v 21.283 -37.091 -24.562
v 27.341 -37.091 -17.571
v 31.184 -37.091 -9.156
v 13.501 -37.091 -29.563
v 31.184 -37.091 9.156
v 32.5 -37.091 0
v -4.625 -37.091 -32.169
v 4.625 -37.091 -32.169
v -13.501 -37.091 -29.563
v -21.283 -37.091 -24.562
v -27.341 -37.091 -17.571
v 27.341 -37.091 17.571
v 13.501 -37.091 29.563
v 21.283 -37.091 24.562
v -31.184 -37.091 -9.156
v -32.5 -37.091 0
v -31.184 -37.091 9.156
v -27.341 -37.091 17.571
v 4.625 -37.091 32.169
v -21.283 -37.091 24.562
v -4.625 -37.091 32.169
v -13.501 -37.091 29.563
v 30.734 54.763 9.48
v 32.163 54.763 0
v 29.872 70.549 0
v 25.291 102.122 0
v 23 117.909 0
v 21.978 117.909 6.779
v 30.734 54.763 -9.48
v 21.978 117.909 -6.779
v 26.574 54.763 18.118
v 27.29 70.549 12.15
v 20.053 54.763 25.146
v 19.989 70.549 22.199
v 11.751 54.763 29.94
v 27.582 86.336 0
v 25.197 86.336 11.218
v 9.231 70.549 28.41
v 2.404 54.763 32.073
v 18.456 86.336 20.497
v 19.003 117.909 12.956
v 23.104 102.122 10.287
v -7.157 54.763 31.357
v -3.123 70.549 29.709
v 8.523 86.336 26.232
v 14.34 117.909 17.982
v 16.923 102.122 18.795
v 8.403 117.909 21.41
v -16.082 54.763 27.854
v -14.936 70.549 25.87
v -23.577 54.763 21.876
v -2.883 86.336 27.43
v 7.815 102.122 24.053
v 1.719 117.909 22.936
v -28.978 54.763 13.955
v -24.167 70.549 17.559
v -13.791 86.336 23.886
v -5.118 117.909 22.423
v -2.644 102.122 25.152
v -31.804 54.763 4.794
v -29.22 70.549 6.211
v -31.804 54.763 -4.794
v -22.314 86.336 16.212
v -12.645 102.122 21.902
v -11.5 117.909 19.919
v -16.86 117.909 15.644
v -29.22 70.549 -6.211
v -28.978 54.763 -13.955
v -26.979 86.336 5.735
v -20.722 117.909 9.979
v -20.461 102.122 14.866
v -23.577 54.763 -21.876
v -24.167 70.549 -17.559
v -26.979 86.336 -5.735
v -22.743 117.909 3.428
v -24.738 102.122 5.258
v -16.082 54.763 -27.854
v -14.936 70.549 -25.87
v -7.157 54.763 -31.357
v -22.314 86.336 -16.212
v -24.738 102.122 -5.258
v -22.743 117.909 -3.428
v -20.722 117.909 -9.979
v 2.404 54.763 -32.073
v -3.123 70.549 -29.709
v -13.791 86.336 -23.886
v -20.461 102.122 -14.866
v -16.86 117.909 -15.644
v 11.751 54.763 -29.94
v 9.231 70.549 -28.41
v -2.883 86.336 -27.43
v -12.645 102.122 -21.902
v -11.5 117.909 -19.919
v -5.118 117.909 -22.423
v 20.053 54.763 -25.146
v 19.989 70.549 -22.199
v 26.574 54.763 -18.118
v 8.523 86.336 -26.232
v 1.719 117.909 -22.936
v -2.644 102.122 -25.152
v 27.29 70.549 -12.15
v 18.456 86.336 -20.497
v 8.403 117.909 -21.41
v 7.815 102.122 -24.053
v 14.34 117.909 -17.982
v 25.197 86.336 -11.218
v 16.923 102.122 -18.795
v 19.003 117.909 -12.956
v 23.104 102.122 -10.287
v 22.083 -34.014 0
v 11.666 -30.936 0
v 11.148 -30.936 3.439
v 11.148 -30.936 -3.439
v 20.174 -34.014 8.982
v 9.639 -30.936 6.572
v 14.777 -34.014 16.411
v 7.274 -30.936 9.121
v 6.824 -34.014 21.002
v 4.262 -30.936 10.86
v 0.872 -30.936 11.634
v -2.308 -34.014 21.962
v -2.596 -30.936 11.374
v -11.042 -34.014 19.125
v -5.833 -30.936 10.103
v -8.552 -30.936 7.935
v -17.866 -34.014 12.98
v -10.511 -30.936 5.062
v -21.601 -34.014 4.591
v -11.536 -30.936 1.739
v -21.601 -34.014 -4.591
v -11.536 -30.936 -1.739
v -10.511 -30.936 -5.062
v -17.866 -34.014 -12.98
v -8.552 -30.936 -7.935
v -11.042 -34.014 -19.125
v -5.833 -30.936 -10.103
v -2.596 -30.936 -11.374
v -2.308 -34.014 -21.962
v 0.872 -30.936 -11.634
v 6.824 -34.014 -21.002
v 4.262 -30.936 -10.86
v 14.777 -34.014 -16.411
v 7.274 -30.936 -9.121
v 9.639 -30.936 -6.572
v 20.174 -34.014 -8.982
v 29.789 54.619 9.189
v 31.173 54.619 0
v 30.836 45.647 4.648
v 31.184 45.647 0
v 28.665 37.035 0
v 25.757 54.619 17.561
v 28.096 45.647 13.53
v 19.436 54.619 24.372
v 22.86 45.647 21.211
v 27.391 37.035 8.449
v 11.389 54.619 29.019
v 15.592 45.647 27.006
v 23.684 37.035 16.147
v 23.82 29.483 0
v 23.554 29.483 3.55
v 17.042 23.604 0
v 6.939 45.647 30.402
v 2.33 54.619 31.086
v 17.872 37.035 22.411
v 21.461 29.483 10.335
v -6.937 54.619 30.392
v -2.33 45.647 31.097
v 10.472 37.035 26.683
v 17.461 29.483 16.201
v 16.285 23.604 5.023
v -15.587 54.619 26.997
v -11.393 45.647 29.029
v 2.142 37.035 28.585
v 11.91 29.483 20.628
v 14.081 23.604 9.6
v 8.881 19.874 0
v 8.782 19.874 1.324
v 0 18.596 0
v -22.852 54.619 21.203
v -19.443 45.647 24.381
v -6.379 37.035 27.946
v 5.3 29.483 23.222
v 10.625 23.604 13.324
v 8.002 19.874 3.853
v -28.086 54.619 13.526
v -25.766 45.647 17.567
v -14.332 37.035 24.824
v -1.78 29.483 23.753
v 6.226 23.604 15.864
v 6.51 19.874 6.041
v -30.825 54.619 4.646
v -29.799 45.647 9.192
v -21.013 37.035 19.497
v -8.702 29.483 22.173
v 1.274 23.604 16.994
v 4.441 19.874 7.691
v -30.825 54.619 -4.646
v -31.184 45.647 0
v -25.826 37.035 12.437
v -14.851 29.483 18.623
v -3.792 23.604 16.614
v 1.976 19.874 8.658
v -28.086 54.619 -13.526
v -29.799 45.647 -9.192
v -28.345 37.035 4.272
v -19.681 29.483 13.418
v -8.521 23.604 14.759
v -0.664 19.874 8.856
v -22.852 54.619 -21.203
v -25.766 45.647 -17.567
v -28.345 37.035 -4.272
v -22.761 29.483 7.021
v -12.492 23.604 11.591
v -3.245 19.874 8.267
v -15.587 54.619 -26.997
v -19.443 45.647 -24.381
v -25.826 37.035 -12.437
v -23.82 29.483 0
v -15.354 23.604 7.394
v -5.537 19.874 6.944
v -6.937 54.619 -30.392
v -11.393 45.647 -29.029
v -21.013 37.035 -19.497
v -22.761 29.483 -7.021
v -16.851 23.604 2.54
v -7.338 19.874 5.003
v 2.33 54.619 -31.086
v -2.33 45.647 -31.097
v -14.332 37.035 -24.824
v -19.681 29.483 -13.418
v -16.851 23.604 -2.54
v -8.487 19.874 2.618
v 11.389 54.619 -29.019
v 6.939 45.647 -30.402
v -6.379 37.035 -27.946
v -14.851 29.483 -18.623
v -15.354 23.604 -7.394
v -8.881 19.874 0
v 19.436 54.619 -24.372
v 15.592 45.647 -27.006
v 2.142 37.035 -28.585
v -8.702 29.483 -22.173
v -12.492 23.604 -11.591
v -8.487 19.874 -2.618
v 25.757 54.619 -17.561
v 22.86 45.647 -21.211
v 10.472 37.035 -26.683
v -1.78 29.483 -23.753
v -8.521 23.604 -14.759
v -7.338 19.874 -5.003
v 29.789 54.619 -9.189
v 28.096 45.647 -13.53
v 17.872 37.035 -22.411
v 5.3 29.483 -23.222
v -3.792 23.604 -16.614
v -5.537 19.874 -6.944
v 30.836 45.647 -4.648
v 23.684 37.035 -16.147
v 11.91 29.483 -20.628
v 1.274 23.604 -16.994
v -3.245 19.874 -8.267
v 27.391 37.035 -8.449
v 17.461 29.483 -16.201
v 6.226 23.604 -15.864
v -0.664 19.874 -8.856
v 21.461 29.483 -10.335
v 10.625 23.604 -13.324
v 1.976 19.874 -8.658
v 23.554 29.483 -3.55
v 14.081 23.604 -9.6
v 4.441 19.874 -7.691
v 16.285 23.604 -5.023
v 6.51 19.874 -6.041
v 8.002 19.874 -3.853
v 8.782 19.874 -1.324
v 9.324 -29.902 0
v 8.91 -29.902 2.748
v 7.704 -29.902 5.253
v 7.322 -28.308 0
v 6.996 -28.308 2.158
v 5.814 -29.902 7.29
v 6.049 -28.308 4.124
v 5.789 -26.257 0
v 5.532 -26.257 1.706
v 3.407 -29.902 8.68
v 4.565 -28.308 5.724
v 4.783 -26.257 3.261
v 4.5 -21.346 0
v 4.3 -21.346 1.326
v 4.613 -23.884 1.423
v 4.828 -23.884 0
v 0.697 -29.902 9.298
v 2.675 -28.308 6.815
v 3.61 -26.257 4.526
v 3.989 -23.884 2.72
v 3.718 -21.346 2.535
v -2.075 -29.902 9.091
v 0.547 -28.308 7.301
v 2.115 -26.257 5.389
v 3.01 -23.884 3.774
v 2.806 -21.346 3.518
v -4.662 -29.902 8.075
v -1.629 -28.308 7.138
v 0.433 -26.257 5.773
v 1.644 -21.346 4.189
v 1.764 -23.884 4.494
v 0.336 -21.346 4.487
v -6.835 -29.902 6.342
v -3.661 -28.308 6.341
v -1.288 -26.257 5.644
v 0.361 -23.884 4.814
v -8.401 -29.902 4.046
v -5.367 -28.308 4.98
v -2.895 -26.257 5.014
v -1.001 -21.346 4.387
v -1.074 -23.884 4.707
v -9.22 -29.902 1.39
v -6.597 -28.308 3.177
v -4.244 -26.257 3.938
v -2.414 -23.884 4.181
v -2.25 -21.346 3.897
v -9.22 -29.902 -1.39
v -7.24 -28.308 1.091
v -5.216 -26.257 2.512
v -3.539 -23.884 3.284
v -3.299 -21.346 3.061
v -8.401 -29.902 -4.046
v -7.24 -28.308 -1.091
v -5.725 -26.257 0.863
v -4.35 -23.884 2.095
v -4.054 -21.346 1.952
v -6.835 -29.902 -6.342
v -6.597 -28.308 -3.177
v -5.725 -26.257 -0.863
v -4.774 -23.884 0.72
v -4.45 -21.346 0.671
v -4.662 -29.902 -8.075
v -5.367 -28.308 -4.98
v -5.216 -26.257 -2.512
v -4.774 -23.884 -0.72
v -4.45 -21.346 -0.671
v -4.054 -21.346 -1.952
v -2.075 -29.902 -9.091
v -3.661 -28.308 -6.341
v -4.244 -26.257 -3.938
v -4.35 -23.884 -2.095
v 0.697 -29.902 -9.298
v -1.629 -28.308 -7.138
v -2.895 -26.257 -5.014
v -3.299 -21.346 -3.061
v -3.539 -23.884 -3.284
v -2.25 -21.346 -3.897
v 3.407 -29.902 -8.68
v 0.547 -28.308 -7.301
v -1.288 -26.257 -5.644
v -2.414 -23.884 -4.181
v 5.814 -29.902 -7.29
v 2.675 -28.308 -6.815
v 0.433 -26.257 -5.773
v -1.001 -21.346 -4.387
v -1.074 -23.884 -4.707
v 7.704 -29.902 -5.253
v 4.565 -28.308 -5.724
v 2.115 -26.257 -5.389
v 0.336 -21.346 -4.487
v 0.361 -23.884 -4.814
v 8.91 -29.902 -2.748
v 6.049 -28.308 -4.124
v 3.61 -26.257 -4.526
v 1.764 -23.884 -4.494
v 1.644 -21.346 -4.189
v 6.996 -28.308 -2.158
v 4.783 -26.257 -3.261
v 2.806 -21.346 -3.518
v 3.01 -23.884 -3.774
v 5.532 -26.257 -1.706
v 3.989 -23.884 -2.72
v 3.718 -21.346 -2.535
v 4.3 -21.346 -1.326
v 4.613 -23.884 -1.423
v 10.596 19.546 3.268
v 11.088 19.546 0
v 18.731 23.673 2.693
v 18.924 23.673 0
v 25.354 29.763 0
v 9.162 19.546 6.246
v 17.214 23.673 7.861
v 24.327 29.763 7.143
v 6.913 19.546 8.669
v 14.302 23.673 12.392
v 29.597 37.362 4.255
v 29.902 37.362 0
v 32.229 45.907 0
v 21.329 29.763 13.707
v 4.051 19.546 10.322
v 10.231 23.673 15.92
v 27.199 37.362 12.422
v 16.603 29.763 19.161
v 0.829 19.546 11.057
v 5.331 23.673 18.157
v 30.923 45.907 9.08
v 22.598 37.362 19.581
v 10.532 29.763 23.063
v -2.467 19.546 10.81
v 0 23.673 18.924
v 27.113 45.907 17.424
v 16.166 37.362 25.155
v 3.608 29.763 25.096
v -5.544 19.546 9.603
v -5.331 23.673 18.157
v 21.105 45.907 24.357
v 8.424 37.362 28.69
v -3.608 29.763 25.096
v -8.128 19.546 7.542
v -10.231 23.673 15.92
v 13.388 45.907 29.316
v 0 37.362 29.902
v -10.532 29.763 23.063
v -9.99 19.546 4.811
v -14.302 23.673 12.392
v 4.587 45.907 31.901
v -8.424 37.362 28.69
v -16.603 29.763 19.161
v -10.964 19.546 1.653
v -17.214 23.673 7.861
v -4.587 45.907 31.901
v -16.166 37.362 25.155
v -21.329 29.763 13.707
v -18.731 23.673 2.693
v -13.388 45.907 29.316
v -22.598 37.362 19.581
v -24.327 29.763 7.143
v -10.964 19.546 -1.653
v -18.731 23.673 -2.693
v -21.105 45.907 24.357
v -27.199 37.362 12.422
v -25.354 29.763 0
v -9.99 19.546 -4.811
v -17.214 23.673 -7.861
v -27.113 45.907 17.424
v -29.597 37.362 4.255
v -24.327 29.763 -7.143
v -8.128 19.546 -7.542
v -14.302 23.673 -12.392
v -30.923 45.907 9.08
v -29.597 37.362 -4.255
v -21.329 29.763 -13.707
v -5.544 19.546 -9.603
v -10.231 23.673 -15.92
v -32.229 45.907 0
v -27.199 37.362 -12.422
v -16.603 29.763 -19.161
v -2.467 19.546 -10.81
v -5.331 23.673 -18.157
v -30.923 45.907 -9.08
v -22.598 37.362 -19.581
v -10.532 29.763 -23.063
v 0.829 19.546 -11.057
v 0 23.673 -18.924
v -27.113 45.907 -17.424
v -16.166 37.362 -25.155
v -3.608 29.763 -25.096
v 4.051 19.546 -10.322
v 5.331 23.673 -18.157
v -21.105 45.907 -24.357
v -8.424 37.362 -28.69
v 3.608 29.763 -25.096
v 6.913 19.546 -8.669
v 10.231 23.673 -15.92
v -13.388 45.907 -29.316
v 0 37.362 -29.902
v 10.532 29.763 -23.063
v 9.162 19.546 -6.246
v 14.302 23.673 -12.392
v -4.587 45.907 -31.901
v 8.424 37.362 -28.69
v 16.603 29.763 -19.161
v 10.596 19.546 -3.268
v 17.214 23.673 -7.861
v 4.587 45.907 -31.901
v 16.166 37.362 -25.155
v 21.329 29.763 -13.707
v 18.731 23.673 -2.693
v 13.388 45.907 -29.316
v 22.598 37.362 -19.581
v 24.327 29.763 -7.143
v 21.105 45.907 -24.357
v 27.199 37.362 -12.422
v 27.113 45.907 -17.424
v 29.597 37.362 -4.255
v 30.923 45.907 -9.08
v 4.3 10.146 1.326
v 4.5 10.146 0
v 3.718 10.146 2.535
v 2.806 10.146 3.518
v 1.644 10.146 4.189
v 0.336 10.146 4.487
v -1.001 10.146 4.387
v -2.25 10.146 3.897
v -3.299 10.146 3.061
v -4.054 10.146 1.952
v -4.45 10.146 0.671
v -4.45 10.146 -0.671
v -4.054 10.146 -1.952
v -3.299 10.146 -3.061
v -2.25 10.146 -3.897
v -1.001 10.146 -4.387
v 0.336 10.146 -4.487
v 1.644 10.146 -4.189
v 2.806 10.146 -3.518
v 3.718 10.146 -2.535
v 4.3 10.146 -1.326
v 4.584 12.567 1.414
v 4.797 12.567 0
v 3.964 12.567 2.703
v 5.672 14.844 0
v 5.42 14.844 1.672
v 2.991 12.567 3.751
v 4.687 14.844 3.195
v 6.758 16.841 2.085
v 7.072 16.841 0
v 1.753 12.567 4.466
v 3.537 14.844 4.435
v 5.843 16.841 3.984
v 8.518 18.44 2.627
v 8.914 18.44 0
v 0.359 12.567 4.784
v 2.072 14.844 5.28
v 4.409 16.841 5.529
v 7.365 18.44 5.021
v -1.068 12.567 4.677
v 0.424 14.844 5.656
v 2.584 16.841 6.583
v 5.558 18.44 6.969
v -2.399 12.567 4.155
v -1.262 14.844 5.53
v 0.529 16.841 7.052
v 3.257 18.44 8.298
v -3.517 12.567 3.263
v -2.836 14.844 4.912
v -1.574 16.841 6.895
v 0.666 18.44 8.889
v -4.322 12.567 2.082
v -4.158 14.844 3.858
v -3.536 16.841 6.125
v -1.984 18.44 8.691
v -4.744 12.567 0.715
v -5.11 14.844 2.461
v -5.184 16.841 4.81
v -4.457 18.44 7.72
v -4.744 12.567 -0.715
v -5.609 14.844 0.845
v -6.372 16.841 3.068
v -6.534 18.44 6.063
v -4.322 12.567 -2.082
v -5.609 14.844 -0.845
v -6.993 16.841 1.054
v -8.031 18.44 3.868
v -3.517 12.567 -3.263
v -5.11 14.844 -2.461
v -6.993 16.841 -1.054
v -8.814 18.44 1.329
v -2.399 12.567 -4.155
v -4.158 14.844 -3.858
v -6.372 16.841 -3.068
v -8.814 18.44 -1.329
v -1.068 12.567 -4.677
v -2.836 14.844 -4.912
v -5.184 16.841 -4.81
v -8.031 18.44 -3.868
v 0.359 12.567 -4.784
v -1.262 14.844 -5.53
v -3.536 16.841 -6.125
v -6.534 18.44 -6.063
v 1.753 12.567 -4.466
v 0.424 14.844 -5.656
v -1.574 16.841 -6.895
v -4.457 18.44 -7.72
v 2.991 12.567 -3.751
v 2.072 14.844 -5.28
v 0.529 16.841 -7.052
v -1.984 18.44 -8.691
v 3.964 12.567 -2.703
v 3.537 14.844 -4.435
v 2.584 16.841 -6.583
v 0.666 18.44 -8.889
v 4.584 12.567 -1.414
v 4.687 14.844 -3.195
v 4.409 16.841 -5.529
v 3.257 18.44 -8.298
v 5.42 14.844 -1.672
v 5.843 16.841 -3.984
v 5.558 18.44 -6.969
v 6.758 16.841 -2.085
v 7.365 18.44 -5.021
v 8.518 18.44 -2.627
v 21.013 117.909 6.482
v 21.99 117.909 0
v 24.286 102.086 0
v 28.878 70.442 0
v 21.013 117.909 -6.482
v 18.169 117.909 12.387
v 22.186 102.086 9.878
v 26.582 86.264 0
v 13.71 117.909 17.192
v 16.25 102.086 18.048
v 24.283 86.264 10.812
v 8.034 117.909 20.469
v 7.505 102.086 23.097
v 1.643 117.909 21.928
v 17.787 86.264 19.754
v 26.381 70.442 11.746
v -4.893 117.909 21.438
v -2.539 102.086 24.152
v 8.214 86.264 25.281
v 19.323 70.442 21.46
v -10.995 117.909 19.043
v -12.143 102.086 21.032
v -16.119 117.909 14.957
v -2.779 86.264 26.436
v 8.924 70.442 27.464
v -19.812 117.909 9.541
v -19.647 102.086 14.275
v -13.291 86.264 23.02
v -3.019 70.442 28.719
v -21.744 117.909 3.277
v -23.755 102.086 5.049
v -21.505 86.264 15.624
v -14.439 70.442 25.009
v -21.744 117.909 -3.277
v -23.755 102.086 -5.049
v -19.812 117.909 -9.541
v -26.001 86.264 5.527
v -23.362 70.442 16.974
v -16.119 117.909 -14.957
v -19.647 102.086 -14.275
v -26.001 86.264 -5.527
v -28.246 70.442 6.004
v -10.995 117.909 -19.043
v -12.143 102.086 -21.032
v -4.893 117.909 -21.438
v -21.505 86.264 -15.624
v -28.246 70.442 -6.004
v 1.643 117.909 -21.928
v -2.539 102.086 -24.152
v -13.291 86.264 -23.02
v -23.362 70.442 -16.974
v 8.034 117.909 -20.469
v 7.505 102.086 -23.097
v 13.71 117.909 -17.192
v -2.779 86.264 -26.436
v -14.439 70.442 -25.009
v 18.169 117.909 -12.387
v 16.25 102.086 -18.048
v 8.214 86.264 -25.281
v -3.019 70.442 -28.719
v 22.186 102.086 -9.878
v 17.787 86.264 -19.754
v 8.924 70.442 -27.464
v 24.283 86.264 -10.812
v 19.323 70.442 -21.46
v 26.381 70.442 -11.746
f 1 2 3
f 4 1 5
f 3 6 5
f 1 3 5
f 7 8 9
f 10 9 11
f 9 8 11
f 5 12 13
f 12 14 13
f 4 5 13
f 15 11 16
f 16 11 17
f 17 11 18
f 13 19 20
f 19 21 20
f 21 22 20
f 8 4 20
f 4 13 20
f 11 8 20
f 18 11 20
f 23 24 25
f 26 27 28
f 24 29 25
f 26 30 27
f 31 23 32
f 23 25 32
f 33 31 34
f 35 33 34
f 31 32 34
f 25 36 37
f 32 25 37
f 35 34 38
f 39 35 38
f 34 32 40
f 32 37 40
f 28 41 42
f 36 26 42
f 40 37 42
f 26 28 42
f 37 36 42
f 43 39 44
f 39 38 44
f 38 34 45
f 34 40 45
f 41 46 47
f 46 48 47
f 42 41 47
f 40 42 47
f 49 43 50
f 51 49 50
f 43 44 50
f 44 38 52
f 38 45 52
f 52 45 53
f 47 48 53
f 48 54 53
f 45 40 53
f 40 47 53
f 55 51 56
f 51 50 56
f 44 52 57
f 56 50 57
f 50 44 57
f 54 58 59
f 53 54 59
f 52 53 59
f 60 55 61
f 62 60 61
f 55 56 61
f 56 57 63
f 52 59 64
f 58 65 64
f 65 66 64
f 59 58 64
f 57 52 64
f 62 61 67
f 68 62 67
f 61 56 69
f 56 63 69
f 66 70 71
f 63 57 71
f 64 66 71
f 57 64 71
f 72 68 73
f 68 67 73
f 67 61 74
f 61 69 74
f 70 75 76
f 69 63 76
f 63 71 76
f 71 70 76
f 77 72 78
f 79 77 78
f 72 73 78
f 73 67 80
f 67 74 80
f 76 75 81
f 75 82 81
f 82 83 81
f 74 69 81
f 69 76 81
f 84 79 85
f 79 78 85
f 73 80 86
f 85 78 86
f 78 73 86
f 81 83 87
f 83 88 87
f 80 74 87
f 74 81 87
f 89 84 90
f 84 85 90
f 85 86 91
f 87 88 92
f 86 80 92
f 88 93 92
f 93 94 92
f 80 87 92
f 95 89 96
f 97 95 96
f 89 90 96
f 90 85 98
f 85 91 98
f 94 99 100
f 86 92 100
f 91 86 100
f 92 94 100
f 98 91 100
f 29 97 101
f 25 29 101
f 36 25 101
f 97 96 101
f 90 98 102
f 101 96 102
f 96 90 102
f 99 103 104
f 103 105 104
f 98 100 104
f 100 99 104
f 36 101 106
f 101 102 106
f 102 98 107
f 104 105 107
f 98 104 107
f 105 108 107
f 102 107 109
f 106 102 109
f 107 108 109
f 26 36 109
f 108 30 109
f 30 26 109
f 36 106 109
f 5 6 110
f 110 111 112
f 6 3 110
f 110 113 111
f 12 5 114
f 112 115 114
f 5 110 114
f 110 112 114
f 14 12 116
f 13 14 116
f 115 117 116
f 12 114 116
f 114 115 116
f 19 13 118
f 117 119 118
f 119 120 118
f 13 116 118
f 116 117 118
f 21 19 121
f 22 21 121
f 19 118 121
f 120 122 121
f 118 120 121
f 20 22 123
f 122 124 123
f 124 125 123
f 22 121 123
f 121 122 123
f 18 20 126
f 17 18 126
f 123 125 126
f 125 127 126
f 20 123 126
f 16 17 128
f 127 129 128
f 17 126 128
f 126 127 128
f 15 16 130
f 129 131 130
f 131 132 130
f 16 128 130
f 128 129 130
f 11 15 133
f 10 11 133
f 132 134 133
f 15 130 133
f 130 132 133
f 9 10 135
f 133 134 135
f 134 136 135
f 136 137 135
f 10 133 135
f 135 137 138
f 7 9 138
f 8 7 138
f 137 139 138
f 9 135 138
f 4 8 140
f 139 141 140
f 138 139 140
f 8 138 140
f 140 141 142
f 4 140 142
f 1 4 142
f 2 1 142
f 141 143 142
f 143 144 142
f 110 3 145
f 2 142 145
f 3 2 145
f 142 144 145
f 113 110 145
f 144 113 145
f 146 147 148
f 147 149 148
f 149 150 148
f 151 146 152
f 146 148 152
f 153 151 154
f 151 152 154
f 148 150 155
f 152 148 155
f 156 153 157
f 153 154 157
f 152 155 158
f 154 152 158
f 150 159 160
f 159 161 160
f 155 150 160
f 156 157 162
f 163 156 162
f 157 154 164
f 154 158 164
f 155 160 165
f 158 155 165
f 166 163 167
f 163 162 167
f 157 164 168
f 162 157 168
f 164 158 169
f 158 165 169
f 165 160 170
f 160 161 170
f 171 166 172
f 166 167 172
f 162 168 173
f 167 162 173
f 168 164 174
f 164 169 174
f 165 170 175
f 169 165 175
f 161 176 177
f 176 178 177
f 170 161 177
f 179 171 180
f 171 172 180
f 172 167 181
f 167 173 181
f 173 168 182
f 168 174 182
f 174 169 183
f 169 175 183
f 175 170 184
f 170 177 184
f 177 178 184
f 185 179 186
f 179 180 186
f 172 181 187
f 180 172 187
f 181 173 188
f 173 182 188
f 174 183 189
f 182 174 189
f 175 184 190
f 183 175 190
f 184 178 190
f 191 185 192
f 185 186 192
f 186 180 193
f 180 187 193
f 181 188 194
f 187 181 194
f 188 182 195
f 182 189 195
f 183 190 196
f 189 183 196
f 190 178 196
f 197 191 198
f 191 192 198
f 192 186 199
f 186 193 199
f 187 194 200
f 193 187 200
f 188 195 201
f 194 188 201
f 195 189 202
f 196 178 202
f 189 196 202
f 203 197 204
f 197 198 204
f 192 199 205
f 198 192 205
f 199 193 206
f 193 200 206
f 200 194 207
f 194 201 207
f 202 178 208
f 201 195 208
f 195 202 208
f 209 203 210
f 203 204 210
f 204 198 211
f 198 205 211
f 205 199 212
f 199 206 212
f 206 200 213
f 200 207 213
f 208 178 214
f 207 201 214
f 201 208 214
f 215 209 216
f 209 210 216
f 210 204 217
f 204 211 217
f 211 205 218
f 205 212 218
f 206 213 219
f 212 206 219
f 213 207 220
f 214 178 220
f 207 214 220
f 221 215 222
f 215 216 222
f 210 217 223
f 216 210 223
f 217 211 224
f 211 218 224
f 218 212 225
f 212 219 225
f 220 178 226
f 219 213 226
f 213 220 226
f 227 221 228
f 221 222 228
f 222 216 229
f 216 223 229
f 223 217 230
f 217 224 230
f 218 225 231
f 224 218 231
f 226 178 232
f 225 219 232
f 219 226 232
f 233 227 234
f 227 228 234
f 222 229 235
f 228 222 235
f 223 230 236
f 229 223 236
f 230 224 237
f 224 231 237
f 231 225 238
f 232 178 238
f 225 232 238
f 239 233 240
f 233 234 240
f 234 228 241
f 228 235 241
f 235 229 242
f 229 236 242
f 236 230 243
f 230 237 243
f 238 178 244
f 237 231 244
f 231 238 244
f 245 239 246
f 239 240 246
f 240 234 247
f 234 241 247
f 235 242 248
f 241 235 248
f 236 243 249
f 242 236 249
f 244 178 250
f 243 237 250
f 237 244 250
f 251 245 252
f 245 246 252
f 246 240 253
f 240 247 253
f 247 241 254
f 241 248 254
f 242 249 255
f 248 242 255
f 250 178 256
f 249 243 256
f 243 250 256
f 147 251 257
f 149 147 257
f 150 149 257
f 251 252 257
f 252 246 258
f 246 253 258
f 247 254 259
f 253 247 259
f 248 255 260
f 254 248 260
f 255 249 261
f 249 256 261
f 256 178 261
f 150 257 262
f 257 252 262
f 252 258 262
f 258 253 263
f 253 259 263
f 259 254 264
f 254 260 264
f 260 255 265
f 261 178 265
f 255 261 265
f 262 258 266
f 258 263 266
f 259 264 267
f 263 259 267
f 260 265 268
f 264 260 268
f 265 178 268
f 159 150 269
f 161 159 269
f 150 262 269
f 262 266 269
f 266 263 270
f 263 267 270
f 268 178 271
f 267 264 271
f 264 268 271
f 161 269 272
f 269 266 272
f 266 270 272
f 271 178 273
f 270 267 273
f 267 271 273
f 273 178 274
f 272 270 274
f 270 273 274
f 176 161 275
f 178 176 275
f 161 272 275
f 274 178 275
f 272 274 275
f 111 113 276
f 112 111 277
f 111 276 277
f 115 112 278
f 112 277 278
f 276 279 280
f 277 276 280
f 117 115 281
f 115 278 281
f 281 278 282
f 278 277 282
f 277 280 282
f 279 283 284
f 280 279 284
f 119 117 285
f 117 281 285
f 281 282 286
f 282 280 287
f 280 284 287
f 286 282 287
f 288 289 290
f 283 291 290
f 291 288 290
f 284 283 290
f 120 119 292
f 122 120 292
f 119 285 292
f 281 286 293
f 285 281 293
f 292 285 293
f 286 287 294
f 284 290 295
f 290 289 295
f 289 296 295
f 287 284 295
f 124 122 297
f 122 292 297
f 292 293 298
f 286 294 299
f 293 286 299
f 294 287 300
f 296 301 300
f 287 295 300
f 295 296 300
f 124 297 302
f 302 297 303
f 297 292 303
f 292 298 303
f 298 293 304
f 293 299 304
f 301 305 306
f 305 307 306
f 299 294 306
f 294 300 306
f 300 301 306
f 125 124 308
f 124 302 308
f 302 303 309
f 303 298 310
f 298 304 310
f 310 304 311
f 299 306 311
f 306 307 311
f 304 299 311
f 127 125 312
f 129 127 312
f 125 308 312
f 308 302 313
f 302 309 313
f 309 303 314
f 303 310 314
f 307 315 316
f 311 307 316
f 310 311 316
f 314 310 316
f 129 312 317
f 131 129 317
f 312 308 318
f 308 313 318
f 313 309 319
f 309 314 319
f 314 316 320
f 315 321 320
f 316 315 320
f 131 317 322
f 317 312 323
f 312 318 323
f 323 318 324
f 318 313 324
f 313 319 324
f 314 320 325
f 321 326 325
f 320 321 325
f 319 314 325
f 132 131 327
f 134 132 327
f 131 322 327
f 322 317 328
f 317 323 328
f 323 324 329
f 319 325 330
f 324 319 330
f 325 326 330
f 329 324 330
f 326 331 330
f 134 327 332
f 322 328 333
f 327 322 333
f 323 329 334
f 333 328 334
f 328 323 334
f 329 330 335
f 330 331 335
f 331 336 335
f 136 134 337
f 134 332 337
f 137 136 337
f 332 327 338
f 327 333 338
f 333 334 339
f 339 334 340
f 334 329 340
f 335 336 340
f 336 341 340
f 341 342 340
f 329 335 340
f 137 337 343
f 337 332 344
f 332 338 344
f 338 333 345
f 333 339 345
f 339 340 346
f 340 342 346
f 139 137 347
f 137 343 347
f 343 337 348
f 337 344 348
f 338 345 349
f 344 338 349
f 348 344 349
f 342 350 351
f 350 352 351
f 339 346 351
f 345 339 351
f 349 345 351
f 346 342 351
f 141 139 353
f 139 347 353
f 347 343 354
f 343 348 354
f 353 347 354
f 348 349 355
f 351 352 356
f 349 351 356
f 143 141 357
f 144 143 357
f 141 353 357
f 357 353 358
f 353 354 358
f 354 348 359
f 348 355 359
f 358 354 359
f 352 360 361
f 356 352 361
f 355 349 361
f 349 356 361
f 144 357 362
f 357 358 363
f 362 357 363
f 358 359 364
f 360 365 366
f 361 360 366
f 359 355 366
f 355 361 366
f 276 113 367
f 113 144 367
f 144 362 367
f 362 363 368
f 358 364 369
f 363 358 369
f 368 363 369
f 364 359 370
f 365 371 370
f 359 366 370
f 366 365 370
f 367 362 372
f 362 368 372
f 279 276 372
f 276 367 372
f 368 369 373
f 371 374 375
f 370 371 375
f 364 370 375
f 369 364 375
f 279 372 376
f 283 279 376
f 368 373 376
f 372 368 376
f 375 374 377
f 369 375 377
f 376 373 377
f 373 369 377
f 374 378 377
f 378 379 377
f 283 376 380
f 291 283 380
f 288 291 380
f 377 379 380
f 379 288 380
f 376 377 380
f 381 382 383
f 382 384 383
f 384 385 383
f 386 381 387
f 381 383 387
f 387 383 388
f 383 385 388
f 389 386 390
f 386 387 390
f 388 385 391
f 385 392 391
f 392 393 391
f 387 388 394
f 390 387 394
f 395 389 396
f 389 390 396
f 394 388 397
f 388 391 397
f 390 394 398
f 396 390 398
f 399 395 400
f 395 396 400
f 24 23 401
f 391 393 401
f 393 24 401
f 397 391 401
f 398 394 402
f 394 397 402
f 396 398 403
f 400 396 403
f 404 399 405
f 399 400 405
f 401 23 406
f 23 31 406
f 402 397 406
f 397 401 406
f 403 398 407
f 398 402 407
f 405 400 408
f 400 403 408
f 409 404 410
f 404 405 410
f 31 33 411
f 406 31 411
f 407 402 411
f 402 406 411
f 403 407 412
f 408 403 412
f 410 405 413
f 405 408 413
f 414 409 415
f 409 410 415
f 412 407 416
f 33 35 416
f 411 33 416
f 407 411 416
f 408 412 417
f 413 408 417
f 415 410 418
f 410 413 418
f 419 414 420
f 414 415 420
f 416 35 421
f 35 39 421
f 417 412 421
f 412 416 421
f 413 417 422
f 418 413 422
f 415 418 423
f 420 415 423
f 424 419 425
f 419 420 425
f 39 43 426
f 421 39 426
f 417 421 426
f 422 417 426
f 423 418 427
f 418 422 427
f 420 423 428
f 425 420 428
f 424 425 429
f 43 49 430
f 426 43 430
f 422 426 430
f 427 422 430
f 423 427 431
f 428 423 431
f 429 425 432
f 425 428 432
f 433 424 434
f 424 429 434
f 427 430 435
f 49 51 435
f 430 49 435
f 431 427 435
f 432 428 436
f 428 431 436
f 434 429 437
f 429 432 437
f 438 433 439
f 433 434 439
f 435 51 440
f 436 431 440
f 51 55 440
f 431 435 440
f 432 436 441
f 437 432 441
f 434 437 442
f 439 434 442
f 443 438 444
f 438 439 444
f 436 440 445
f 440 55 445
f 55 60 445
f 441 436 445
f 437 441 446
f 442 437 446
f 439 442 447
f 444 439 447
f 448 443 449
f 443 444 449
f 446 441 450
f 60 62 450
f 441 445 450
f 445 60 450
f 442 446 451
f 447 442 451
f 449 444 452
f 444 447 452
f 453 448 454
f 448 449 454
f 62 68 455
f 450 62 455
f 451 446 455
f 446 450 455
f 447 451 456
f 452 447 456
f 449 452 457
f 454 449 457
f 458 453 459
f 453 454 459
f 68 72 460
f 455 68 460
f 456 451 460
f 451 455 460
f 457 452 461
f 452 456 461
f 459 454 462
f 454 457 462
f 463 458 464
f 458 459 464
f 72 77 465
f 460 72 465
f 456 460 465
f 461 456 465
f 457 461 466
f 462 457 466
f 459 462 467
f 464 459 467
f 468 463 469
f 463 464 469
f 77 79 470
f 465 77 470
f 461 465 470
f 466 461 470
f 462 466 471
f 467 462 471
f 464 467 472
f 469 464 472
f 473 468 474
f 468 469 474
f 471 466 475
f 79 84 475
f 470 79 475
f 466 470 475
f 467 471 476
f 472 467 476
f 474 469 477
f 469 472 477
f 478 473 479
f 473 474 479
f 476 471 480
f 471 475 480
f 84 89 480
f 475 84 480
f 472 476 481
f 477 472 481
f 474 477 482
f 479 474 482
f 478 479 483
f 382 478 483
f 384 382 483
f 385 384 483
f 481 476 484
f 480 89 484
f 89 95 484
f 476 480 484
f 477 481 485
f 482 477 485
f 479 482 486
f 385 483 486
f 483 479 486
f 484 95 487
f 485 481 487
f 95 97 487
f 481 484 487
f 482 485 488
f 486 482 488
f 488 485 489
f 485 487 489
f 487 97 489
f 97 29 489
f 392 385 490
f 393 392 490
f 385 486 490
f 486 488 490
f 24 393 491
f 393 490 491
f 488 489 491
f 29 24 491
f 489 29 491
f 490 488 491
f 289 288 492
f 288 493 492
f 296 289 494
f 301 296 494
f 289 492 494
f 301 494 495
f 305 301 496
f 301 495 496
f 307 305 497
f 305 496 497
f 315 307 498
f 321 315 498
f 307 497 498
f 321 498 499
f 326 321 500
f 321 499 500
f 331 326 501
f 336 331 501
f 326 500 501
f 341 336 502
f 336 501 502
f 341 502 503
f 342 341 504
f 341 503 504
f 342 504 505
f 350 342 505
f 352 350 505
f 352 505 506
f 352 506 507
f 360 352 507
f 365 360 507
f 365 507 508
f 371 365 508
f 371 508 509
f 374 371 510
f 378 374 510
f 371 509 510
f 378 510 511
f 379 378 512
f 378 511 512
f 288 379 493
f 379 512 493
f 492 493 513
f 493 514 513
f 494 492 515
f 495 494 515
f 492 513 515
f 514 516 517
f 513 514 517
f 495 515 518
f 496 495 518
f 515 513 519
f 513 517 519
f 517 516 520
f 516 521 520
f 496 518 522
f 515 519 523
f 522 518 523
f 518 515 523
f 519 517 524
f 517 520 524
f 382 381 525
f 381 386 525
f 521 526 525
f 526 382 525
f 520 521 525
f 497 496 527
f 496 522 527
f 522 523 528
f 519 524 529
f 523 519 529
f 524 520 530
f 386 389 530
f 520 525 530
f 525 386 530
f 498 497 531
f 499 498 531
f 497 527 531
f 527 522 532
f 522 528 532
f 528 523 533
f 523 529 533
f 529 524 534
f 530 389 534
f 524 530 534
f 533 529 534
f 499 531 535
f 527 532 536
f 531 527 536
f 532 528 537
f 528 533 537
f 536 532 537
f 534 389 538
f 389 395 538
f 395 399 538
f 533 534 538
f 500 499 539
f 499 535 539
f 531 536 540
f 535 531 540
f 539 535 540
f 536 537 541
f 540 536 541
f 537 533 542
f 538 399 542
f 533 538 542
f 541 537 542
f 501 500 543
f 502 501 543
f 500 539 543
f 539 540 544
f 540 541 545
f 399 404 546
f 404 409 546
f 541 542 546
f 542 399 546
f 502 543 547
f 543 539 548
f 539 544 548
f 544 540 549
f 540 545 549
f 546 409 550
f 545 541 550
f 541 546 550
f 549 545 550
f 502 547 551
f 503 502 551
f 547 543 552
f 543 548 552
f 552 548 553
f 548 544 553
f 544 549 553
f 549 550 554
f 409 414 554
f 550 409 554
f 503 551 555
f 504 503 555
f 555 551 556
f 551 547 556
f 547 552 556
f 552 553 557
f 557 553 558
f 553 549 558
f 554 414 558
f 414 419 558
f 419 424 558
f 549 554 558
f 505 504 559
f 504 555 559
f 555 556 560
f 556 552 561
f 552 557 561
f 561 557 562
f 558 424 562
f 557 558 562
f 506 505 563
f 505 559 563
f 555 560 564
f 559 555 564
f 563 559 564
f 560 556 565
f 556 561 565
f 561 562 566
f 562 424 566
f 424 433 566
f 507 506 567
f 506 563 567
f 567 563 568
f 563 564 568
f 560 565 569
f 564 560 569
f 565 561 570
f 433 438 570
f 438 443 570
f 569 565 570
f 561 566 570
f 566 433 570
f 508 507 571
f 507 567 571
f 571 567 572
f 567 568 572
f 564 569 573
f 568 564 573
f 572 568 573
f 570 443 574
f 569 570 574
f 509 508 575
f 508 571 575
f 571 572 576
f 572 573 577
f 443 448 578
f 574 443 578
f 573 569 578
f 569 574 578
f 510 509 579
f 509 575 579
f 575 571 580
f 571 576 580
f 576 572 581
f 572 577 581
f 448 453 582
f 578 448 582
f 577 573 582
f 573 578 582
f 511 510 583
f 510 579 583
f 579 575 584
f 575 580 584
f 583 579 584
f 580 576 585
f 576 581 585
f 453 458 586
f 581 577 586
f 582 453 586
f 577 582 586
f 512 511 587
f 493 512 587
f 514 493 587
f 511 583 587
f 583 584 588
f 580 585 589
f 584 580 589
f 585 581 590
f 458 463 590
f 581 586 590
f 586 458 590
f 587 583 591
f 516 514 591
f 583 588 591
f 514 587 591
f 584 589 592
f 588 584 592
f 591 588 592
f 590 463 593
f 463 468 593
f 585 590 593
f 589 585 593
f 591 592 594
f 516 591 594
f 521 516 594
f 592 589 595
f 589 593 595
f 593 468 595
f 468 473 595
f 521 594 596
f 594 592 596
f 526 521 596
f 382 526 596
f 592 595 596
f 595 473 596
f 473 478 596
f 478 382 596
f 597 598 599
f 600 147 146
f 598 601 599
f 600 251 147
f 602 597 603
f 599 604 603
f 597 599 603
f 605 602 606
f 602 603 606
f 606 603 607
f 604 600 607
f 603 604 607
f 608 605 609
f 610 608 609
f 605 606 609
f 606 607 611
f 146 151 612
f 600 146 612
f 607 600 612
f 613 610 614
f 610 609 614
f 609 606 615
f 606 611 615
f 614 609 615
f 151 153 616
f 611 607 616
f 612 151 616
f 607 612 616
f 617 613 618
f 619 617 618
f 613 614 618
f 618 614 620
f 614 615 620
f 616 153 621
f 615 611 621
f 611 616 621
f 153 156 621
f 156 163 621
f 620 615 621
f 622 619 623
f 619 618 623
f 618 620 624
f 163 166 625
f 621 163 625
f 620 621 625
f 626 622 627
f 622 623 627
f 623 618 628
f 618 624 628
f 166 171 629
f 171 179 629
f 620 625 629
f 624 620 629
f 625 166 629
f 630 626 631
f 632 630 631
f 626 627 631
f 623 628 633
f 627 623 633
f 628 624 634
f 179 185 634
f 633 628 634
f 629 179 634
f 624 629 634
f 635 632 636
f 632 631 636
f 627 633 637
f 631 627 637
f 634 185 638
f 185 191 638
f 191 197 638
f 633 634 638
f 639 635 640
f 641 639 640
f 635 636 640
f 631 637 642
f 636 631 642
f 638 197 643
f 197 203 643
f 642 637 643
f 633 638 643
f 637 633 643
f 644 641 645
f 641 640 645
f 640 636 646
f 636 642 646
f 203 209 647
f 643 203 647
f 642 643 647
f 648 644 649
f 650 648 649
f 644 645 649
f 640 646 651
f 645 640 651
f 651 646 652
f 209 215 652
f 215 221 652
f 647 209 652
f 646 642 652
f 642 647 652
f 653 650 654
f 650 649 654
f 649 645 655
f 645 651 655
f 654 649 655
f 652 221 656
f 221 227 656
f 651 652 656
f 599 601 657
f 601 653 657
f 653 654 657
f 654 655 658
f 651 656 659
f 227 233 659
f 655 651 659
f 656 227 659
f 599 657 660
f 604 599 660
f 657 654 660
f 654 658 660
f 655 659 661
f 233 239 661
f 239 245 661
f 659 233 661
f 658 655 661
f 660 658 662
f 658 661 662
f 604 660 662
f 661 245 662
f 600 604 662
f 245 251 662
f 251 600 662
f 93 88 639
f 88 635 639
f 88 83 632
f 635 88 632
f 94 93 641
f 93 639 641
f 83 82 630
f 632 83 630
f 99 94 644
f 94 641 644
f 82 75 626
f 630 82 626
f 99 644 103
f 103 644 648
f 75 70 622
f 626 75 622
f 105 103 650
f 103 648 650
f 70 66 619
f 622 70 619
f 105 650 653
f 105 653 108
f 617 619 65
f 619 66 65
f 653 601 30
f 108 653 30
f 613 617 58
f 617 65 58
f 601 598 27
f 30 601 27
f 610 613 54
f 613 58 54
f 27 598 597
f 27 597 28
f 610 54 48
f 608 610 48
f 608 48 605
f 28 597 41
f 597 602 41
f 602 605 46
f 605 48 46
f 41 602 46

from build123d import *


with BuildPart() as part:
    # Sketch2 → Revolve1 (revolve)
    with BuildSketch(Plane.XY):
        with BuildLine():
            Line((0, -37.091298276), (32.5, -37.091298276))
            Line((32.5, -37.091298276), (11.66645179, -30.935726736))
            ThreePointArc((11.66645179, -30.935726736), (6.489523045, -27.331580559), (4.5, -21.345575301))
            Line((4.5, -21.345575301), (4.5, 10.145686892))
            ThreePointArc((4.5, 10.145686892), (6.311054798, 15.885127323), (11.088235294, 19.545679529))
            ThreePointArc((11.088235294, 19.545679529), (27.887861488, 33.406821561), (32.163132951, 54.762868775))
            Line((32.163132951, 54.762868775), (23, 117.908701724))
            Line((23, 117.908701724), (21.989526299, 117.908701724))
            Line((21.989526299, 117.908701724), (31.173498091, 54.619262216))
            ThreePointArc((31.173498091, 54.619262216), (23.819567674, 29.483081871), (0, 18.595655602))
            Line((0, 18.595655602), (0, -37.091298276))
        make_face()
    revolve(axis=Axis((0, 117.908701724, 0), (0, -1, 0)))


solid = part.part
